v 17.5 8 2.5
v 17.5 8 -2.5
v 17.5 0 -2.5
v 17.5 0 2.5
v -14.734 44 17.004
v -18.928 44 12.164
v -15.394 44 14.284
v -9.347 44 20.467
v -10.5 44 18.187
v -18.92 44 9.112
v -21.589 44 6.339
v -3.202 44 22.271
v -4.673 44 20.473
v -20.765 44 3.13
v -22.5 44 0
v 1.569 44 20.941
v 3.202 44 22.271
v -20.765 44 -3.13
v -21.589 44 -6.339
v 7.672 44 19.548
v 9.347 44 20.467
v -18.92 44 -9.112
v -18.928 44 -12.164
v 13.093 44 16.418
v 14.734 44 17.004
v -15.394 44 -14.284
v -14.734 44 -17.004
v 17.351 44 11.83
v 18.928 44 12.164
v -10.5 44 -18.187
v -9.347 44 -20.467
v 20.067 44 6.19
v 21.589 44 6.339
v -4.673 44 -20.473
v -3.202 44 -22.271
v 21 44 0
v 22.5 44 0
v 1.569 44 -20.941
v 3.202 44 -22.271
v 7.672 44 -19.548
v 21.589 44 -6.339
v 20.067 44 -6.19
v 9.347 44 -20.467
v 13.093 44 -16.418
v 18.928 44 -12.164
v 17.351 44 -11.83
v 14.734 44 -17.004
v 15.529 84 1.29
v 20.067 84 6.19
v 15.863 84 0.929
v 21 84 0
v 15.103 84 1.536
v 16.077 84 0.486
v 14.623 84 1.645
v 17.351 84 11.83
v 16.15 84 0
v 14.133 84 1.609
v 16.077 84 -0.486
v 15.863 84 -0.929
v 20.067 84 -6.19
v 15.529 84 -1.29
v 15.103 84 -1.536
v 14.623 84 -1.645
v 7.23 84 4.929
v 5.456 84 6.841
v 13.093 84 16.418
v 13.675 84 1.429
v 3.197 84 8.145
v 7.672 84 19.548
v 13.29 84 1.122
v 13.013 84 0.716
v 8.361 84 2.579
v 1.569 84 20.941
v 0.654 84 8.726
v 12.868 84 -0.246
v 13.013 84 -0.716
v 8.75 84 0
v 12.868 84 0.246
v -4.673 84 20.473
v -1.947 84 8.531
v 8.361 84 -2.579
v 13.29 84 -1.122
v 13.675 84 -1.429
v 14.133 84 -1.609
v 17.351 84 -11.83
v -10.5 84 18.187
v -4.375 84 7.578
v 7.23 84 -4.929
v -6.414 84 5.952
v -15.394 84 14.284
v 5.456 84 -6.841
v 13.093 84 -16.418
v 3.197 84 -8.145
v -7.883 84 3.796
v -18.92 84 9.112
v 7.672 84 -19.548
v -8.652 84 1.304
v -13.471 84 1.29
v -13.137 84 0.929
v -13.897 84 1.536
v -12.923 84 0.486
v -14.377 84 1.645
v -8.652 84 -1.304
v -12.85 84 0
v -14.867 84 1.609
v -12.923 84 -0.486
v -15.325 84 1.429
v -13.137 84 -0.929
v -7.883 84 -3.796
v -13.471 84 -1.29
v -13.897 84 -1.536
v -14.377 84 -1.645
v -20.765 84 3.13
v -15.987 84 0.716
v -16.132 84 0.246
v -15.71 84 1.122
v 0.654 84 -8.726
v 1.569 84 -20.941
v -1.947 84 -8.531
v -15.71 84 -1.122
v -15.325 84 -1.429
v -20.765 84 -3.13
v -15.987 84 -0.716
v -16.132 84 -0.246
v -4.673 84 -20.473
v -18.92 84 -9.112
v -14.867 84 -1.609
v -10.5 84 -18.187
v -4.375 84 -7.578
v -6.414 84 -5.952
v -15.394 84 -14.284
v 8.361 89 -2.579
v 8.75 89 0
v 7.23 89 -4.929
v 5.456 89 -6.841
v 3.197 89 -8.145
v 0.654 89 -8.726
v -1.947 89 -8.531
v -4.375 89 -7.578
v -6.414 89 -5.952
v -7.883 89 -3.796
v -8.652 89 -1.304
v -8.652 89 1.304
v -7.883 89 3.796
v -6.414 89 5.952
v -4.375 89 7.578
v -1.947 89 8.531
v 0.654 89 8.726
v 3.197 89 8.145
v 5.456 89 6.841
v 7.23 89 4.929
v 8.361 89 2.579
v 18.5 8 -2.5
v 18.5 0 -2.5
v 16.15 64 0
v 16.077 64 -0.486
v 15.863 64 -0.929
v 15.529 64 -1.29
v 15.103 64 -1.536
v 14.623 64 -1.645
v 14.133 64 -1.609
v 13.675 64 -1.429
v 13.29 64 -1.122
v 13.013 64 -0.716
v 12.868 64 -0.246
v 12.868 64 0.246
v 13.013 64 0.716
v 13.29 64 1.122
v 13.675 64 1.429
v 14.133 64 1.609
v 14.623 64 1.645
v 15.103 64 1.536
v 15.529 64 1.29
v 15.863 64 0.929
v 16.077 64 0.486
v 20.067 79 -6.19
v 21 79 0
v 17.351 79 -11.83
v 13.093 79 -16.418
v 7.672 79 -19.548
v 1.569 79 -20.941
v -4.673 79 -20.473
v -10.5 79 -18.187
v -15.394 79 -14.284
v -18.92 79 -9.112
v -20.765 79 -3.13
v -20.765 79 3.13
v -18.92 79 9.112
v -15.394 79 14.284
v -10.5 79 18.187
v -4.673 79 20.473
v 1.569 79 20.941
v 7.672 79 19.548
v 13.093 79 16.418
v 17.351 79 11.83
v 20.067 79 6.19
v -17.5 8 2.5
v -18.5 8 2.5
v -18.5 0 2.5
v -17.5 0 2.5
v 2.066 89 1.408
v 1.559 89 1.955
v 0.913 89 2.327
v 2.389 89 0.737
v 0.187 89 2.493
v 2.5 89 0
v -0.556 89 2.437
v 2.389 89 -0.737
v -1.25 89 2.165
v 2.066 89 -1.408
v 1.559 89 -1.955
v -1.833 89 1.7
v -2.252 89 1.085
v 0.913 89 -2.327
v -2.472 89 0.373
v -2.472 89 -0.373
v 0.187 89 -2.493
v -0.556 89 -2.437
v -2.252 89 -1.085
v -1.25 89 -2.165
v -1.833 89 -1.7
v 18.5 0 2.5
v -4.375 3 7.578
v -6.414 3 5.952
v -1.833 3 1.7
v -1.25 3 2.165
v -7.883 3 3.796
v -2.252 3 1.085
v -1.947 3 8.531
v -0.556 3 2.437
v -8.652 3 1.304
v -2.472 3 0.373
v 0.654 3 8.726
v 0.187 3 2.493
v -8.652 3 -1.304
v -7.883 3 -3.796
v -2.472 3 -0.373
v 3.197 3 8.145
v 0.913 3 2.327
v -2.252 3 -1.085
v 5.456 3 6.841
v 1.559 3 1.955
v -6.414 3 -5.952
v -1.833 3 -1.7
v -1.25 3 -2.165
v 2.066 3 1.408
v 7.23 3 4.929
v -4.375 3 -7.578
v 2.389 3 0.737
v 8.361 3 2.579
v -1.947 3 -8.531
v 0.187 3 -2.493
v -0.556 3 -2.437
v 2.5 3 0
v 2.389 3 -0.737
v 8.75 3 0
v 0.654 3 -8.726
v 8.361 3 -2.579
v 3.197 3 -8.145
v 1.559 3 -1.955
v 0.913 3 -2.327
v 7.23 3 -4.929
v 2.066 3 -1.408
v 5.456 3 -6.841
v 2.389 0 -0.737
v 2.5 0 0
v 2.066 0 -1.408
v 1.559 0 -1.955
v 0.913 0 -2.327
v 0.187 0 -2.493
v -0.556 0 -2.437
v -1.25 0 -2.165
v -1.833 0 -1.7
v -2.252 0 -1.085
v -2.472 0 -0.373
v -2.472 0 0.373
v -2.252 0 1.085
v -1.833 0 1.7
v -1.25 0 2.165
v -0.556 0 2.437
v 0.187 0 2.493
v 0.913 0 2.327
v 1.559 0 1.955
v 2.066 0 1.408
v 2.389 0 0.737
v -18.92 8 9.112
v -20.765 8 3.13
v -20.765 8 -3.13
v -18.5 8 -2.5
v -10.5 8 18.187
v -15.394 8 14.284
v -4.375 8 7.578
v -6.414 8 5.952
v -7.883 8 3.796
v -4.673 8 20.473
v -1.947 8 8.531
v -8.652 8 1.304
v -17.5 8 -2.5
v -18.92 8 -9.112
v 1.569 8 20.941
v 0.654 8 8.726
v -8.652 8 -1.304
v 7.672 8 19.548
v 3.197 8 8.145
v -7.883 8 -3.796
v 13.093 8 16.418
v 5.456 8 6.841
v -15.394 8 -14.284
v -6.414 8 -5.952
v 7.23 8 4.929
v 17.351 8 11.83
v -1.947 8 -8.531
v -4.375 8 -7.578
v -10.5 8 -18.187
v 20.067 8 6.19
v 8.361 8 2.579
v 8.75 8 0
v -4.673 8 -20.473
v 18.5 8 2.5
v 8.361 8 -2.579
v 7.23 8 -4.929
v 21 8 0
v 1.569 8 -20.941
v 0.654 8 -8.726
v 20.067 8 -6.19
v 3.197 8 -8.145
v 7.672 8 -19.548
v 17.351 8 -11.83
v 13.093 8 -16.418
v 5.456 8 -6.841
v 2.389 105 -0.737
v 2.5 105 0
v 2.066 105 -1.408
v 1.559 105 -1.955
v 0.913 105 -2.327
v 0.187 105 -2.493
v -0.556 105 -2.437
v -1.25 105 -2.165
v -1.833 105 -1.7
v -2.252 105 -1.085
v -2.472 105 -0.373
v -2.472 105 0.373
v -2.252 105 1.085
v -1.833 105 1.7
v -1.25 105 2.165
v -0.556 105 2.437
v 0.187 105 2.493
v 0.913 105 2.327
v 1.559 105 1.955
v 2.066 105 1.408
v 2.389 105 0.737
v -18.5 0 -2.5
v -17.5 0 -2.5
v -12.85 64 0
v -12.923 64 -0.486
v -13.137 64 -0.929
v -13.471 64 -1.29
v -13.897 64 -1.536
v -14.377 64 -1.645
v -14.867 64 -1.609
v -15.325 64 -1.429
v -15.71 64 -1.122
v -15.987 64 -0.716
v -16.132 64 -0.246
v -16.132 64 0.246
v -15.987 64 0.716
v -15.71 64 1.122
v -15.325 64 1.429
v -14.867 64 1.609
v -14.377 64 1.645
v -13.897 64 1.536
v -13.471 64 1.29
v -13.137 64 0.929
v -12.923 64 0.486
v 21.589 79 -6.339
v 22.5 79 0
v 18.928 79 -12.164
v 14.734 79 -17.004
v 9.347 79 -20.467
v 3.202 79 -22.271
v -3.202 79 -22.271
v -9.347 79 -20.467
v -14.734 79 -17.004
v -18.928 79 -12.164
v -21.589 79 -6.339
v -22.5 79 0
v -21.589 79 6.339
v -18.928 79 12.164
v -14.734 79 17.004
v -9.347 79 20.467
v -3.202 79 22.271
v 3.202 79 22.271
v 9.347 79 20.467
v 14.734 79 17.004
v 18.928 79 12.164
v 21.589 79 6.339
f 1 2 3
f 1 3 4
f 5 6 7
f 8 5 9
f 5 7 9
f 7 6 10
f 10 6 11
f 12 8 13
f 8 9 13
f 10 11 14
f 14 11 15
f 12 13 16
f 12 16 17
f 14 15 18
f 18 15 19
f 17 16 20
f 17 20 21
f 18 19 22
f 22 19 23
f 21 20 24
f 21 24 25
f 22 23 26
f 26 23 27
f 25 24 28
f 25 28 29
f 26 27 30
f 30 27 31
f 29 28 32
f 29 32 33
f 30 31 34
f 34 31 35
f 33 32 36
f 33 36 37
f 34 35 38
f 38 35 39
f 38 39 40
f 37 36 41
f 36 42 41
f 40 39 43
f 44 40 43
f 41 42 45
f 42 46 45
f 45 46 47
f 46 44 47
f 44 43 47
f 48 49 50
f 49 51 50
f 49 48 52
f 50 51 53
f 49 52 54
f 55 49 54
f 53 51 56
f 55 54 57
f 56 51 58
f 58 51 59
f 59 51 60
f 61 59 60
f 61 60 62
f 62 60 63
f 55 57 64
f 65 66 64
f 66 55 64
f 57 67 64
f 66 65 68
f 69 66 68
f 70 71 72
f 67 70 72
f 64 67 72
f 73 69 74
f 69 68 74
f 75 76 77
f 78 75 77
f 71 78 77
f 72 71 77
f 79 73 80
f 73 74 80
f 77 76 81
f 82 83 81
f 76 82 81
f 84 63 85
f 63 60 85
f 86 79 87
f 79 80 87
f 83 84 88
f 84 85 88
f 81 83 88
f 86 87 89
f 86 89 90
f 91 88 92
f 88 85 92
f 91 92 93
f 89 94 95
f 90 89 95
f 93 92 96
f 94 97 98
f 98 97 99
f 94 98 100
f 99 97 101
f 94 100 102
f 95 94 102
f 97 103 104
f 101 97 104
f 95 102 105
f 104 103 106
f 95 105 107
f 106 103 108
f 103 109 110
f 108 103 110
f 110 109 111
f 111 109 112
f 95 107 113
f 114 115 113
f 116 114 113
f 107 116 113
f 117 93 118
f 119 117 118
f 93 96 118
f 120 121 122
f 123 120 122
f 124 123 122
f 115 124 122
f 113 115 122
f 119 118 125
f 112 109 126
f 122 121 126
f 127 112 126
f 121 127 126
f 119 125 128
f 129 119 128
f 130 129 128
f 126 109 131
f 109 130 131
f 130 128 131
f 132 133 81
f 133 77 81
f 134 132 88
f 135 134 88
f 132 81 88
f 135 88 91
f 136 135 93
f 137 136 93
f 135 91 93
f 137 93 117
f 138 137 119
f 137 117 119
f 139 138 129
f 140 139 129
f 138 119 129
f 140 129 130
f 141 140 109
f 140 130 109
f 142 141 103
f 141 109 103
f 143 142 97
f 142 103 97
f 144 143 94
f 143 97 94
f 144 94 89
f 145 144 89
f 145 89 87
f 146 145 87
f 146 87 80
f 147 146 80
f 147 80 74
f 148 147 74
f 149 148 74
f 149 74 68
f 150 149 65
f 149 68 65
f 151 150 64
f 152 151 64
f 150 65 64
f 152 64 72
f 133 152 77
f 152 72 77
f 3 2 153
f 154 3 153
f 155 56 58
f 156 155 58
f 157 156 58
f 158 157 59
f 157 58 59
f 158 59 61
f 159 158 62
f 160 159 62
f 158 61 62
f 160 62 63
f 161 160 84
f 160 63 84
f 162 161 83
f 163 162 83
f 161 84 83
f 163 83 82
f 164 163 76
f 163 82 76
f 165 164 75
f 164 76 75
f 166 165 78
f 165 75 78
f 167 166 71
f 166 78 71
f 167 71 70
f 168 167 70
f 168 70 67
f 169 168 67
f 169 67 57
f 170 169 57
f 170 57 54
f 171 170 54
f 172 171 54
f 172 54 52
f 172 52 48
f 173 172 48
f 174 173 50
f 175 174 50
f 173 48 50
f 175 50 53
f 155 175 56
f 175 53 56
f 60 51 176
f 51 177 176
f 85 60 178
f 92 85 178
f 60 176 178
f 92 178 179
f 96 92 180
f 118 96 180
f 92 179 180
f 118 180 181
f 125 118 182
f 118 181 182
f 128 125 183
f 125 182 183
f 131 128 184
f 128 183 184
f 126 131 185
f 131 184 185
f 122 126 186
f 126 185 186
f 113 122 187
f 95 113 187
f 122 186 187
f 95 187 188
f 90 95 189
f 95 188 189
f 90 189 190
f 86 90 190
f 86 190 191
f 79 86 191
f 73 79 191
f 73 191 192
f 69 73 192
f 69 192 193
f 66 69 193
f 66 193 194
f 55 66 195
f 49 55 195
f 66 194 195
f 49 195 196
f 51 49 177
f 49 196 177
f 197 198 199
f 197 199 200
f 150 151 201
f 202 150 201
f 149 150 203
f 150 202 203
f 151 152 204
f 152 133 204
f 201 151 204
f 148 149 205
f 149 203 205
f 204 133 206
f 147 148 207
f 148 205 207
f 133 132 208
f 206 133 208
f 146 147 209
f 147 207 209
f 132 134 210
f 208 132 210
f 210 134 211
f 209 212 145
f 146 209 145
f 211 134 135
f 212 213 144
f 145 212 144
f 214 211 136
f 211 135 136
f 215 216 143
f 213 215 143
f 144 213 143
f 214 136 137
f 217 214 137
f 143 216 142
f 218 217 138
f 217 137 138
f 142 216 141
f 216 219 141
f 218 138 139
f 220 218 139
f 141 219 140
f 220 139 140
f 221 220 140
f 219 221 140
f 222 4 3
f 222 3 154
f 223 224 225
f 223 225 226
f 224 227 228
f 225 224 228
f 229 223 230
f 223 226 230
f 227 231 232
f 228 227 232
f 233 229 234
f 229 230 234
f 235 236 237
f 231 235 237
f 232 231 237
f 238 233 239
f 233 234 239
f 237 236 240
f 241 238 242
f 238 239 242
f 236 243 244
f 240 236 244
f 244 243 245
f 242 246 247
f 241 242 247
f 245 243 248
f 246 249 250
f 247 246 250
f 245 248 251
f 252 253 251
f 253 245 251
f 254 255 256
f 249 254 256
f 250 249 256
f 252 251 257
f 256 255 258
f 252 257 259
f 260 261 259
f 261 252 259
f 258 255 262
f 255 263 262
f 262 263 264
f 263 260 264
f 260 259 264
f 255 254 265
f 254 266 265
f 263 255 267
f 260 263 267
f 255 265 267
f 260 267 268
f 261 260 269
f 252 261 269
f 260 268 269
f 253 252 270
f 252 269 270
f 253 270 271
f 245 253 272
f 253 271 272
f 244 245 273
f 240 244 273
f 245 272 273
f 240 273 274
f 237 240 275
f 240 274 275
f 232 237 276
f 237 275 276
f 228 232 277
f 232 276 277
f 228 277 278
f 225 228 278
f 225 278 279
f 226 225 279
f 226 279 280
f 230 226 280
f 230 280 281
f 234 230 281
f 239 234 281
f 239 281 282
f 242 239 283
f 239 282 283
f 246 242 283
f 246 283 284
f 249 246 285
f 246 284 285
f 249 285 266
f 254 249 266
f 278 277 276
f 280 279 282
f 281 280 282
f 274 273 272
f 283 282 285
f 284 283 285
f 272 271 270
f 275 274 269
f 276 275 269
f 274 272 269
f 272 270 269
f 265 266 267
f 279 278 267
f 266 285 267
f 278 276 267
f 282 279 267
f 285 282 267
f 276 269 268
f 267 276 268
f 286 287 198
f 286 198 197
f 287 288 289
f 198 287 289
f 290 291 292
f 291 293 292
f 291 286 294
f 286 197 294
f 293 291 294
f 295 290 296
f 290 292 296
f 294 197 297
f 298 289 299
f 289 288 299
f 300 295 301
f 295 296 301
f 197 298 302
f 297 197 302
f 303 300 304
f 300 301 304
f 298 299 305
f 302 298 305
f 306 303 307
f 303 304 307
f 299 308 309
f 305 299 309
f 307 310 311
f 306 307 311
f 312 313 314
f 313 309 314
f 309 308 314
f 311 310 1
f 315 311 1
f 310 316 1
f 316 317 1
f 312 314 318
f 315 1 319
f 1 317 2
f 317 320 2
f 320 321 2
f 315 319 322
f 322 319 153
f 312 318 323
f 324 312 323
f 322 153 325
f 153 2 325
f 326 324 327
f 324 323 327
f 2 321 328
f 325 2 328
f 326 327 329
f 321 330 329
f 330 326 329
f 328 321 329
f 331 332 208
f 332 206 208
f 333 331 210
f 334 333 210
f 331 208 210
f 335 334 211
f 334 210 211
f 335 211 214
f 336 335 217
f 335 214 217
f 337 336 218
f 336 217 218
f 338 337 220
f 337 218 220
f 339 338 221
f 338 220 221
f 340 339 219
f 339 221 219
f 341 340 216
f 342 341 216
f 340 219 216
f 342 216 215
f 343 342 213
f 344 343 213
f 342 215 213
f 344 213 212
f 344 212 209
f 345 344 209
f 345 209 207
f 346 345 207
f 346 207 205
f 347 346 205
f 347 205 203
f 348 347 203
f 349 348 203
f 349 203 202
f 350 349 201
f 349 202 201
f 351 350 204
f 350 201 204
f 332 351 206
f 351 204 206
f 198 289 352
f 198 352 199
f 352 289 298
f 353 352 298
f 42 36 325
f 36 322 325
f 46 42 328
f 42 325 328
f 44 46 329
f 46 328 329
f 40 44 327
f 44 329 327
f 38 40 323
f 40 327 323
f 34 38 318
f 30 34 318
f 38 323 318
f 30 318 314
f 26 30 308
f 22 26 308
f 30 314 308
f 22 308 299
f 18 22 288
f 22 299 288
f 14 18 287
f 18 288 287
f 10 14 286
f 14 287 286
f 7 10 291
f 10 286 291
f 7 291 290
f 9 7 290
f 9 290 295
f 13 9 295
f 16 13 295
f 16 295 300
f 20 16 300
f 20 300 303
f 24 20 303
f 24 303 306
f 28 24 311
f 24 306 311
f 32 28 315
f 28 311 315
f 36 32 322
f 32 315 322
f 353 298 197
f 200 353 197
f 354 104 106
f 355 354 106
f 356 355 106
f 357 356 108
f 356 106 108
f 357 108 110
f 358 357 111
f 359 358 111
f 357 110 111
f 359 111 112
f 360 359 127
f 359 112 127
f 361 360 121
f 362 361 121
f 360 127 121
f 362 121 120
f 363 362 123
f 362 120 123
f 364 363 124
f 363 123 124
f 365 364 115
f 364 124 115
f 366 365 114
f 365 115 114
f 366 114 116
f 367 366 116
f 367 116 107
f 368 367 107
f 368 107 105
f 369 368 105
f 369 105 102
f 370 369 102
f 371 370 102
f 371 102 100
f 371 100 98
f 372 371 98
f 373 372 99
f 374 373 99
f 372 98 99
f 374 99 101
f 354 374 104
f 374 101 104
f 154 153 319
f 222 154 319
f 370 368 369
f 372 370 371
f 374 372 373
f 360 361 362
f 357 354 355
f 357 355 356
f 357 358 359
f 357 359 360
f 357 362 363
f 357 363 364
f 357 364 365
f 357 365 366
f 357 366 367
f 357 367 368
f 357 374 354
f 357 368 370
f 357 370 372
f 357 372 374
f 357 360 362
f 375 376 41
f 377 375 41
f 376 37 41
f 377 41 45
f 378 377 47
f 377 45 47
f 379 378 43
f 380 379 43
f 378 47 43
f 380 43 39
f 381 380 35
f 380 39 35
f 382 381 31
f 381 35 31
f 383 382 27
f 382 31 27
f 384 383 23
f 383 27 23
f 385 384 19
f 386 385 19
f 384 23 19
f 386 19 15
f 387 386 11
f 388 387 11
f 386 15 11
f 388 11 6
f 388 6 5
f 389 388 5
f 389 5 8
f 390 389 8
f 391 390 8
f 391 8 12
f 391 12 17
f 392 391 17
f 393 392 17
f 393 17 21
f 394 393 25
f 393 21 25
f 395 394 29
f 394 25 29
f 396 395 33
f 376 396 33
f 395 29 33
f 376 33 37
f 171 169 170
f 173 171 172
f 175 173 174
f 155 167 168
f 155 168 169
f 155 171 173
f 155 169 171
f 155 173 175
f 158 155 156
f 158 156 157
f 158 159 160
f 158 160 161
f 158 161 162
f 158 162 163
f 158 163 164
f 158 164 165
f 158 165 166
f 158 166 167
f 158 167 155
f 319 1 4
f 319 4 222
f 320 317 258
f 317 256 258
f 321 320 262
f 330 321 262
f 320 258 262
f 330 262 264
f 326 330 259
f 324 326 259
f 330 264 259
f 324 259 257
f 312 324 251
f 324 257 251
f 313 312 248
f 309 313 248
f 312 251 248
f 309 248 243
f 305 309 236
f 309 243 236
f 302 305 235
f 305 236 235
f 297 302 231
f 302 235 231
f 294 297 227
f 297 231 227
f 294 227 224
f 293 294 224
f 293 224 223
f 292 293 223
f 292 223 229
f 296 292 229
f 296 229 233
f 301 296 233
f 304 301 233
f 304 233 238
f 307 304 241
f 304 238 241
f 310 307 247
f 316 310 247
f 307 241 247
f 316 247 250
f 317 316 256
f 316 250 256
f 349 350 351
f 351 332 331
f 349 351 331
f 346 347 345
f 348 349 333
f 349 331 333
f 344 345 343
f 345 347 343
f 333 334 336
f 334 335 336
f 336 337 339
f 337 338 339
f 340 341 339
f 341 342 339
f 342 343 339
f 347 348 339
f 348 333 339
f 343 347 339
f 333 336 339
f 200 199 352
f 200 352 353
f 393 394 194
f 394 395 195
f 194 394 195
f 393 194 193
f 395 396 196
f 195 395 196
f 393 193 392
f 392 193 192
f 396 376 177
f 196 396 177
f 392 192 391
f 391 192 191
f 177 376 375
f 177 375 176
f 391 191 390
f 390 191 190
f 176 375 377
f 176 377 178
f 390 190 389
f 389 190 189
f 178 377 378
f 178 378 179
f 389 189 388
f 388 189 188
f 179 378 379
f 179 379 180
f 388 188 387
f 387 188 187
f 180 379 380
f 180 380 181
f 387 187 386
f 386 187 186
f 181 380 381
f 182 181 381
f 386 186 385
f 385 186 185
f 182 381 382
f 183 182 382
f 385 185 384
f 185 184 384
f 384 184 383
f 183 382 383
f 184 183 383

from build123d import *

# Parameters (mm, degrees)
SKETCH2_R           = 1.65
CUT_EXTRUDE1_DEPTH  = 20
SKETCH3_W           = 1
SKETCH3_H           = 5
BOSS_EXTRUDE1_DEPTH = 8


with BuildPart() as part:
    # Sketch1 → Revolve1 (revolve)
    with BuildSketch(Plane.XY):
        Polygon((0, 0), (0, 105), (2.5, 105), (2.5, 89), (8.75, 89), (8.75, 84), (21, 84), (21, 79), (22.5, 79), (22.5, 44), (21, 44), (21, 8), (8.75, 8), (8.75, 3), (2.5, 3), (2.5, 0), align=None)
    revolve(axis=Axis((0, 0, 0), (0, 1, 0)))

    # Sketch2 → Cut-Extrude1 (cut)
    with BuildSketch(Plane(origin=(0, 84, 0), x_dir=(1, 0, 0), z_dir=(0, 1, 0))):
        with Locations((14.5, 0)):
            Circle(SKETCH2_R)
        with Locations((-14.5, 0)):
            Circle(SKETCH2_R)
    extrude(amount=-CUT_EXTRUDE1_DEPTH, mode=Mode.SUBTRACT)

    # Sketch3 → Boss-Extrude1 (add)
    with BuildSketch(Plane.XZ.offset(-8)):
        with Locations((-18, 0)):
            Rectangle(SKETCH3_W, SKETCH3_H)
        with Locations((18, 0)):
            Rectangle(SKETCH3_W, SKETCH3_H)
    extrude(amount=BOSS_EXTRUDE1_DEPTH)


solid = part.part
